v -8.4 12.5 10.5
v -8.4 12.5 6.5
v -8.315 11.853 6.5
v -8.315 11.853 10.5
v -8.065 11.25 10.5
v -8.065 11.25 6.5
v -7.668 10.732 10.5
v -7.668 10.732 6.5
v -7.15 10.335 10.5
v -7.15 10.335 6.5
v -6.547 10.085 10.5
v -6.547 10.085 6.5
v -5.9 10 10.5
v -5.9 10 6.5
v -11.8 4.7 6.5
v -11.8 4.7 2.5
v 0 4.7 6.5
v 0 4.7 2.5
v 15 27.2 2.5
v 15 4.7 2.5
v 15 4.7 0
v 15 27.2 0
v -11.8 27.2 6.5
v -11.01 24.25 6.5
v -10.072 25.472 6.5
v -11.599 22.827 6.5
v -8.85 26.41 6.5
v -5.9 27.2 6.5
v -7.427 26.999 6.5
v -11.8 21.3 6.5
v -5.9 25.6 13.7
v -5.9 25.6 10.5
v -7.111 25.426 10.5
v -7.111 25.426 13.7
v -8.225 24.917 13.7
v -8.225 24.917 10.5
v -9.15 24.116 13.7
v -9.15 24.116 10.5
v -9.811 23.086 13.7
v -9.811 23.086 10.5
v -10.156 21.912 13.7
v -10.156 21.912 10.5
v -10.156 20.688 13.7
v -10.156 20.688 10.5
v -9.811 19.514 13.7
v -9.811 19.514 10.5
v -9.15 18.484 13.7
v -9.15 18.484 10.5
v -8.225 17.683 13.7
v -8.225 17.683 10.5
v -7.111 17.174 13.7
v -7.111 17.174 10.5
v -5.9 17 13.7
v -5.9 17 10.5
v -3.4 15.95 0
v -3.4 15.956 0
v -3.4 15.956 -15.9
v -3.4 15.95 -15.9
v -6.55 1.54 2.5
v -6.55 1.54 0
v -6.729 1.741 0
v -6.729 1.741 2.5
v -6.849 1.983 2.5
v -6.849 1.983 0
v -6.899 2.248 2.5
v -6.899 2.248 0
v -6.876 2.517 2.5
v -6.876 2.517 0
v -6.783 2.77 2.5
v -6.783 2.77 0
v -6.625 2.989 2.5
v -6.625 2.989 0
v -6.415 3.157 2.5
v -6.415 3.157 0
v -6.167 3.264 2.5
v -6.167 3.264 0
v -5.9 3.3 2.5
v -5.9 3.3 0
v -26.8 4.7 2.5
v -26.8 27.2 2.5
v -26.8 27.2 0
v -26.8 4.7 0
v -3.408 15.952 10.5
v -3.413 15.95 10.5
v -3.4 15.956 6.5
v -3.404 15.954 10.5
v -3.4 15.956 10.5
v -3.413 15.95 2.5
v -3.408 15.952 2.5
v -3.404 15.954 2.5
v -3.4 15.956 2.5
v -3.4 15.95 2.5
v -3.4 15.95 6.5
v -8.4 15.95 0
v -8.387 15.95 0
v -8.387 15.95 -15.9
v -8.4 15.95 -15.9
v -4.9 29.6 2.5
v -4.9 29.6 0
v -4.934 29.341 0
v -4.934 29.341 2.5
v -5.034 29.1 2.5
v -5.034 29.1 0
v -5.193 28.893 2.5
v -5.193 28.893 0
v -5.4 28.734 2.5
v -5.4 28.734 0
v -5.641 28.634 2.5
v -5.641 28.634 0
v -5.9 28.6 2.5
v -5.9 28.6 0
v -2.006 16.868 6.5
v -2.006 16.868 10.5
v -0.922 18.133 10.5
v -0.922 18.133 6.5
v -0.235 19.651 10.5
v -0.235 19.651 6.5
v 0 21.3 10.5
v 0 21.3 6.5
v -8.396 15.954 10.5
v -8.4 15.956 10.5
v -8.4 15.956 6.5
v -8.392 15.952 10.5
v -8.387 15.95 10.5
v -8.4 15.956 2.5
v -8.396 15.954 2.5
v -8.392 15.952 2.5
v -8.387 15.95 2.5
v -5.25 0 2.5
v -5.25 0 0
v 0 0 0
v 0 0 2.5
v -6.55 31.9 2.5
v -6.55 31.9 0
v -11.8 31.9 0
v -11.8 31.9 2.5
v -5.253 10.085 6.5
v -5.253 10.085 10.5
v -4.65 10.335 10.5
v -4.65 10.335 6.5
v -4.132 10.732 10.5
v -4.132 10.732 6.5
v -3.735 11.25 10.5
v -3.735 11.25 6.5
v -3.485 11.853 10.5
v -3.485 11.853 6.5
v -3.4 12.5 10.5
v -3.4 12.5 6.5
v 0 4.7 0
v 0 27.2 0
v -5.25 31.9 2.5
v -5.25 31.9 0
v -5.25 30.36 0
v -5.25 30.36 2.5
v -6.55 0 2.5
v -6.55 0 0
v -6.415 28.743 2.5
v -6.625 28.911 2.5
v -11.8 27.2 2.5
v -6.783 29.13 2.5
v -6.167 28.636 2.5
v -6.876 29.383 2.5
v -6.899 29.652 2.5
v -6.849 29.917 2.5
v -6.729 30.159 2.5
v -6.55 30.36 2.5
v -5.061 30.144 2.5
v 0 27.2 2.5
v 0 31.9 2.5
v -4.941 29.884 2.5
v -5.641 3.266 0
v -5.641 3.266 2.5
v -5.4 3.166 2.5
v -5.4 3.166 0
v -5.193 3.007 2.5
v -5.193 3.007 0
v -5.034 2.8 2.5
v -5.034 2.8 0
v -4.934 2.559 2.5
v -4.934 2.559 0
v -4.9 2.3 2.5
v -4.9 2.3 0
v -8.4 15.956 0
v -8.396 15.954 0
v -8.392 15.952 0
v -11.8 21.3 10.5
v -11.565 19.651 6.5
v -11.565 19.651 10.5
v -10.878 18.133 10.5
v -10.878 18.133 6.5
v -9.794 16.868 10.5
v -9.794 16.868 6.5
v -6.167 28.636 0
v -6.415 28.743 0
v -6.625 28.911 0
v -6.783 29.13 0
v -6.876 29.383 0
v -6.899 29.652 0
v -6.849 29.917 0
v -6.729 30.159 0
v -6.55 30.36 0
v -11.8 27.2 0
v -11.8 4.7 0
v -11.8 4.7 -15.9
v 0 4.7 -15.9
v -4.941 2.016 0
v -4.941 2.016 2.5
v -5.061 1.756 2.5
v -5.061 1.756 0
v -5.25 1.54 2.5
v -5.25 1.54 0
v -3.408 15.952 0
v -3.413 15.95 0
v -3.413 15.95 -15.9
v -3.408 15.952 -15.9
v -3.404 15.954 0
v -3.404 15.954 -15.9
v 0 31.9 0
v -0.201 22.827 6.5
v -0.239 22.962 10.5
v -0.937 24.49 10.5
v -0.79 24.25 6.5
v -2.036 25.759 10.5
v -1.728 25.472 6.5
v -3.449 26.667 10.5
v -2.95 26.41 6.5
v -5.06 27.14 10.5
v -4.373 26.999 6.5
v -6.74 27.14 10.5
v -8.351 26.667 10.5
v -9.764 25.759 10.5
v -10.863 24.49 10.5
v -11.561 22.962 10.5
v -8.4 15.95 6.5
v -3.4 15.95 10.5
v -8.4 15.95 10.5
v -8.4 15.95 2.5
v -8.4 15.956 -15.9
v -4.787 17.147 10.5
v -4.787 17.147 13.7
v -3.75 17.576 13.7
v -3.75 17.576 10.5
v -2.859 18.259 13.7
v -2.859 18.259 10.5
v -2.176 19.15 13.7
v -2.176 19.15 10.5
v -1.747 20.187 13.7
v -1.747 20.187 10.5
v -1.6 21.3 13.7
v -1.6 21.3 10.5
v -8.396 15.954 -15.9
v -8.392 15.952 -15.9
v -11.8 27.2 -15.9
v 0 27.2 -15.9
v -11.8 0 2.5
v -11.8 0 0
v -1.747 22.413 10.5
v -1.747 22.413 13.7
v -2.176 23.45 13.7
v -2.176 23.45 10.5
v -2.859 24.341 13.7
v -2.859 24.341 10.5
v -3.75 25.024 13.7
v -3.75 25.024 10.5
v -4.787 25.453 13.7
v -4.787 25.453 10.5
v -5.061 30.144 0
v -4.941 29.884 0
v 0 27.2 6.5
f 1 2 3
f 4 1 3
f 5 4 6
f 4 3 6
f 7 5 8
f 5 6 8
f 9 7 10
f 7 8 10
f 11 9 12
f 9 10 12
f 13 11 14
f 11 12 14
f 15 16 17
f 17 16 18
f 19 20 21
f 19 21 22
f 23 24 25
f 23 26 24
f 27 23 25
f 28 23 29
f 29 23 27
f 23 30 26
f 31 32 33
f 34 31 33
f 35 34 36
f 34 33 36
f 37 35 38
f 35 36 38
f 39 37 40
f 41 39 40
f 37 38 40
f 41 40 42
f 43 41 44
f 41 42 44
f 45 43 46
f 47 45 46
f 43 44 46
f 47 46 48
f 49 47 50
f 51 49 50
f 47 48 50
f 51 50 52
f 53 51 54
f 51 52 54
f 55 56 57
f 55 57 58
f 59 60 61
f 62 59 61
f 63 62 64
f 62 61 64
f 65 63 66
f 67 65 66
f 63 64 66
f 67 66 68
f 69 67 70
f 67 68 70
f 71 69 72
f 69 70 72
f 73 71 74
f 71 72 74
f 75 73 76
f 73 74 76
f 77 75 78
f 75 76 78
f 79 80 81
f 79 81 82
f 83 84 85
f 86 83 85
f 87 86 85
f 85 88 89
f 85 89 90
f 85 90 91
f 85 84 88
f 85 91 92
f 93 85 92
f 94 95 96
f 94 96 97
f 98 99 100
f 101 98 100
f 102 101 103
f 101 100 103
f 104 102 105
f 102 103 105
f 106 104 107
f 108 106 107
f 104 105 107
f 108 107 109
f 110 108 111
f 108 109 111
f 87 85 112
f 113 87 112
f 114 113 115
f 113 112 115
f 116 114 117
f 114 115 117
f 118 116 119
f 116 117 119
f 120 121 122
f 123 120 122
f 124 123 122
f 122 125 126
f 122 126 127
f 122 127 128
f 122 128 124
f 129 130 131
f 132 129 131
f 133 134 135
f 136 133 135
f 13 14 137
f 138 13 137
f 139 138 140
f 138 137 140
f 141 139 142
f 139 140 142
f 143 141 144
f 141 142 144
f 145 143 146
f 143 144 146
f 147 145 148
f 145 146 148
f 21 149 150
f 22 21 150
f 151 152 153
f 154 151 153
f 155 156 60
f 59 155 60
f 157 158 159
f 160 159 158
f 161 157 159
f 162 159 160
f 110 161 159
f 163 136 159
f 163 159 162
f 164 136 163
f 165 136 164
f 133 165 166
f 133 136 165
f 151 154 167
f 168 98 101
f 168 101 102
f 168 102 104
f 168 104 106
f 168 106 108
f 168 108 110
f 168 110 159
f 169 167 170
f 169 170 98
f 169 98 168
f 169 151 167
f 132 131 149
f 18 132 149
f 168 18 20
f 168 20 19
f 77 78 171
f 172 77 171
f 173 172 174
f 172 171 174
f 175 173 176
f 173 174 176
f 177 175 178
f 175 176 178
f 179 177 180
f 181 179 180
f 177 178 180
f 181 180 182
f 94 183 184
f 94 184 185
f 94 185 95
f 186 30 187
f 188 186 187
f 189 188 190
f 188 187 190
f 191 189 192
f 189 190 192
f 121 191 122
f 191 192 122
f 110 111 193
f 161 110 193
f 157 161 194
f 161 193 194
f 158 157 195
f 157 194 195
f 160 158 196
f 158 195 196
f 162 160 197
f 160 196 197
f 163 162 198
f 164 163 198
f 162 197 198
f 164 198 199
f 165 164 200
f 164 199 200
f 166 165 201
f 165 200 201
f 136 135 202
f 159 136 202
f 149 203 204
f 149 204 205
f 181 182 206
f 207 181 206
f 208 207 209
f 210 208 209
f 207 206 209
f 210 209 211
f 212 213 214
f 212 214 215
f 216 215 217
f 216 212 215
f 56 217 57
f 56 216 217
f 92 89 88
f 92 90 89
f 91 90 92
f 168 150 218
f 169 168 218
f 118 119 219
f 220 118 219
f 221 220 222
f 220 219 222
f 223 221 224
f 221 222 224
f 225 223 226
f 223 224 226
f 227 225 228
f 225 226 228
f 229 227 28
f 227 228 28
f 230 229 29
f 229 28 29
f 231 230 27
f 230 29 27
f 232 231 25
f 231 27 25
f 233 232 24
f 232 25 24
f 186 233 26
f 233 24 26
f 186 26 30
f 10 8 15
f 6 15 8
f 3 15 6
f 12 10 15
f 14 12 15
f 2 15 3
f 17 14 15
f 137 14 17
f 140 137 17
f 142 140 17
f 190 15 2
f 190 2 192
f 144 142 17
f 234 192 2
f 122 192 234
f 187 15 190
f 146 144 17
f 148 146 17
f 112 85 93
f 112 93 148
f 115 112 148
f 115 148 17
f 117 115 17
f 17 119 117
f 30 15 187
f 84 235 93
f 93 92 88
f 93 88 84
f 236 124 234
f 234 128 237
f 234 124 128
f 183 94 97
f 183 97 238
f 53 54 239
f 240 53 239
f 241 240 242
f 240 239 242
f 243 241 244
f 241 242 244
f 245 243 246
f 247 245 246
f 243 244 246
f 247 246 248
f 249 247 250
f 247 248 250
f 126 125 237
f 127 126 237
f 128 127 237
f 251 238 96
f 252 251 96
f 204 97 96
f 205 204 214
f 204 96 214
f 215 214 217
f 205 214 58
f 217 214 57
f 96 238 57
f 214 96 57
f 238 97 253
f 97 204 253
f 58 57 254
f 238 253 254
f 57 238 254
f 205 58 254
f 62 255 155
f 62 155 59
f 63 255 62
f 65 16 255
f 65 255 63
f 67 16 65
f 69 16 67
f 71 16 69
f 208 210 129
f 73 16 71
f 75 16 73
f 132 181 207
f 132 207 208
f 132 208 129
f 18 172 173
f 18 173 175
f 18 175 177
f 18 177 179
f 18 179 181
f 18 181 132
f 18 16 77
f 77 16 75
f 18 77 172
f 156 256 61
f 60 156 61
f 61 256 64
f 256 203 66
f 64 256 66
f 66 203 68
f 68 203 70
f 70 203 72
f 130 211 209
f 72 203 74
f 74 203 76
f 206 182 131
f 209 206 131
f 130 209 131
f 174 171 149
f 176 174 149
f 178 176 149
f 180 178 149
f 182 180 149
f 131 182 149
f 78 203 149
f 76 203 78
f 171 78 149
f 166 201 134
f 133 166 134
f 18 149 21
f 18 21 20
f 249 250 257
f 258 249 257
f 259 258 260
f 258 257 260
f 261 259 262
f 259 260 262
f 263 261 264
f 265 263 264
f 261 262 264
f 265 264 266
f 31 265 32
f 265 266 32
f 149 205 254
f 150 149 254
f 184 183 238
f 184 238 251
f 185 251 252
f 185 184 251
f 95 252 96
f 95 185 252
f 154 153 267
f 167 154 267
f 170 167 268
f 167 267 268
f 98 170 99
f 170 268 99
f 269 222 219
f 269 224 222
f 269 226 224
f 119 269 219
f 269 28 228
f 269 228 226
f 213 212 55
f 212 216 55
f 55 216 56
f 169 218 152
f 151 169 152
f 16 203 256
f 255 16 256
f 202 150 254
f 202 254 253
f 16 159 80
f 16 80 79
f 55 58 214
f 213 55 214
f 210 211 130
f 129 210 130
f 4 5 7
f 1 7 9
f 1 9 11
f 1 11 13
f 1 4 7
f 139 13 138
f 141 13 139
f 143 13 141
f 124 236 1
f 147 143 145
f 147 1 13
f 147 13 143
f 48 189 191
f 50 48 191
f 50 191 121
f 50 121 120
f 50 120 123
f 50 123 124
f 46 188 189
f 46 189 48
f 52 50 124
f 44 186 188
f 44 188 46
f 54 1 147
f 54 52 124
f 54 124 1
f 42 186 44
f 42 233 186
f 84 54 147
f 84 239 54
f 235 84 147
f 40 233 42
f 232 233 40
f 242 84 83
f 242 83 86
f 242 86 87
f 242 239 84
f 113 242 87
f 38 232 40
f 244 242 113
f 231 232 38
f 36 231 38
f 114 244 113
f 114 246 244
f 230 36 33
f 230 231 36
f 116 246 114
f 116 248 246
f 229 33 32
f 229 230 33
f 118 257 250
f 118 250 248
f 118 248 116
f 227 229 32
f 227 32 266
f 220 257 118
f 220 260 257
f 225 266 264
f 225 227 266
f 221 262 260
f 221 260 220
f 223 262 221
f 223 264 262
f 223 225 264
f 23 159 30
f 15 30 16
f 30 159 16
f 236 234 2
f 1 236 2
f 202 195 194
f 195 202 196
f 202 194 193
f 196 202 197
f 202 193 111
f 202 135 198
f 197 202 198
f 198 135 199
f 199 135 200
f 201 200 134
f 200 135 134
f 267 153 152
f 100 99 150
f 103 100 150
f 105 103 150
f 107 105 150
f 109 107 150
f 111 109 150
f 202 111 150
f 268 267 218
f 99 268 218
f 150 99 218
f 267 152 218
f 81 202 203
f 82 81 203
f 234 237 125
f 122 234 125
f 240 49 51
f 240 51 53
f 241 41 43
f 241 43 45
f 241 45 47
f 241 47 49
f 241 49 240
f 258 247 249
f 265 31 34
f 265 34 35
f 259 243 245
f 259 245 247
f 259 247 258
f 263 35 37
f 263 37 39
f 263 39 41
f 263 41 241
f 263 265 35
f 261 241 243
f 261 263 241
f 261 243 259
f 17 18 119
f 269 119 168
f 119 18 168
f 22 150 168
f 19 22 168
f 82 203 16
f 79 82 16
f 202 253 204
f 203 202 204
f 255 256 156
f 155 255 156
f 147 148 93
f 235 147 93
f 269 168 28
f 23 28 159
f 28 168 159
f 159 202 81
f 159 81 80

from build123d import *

# Parameters (mm, degrees)
F1_DEPTH  = 15.9
F2_DEPTH  = 2.5
F5_DEPTH  = 4
F8_DEPTH  = 4
F11_DEPTH = 3.2
F12_W     = 22.5
F12_H     = 2.5
F13_DEPTH = 15
F14_W     = 22.5
F14_H     = 2.5
F15_DEPTH = 15


with BuildPart() as f1:
    # F0 (on Top) → F1 (new body)
    with BuildSketch(Plane.XY):
        with BuildLine():
            ThreePointArc((-5.9, 27.2), (-1.728069991, 25.471930009), (0, 21.3))
            Line((0, 21.3), (0, 27.2))
            Line((0, 27.2), (-5.9, 27.2))
        make_face()
        with BuildLine():
            ThreePointArc((-11.8, 21.3), (-10.071930009, 25.471930009), (-5.9, 27.2))
            Line((-5.9, 27.2), (-11.8, 27.2))
            Line((-11.8, 27.2), (-11.8, 21.3))
        make_face()
        with BuildLine():
            Line((-3.4, 15.95), (0, 15.95))
            Line((0, 15.95), (0, 21.3))
            ThreePointArc((0, 21.3), (-0.9220486141, 18.1329824756), (-3.4, 15.9558443136))
            Line((-3.4, 15.9558443136), (-3.4, 15.95))
        make_face()
        with BuildLine():
            Line((-11.8, 21.3), (-11.8, 15.95))
            Line((-11.8, 15.95), (-8.4, 15.95))
            Line((-8.4, 15.95), (-8.4, 15.9558443136))
            ThreePointArc((-8.4, 15.9558443136), (-10.8779513859, 18.1329824756), (-11.8, 21.3))
        make_face()
        with BuildLine():
            Line((-5.9, 4.7), (0, 4.7))
            Line((0, 4.7), (0, 15.95))
            Line((0, 15.95), (-3.4, 15.95))
            Line((-3.4, 15.95), (-3.4, 12.5))
            ThreePointArc((-3.4, 12.5), (-4.132233047, 10.732233047), (-5.9, 10))
            Line((-5.9, 10), (-5.9, 4.7))
        make_face()
        with BuildLine():
            Line((-11.8, 4.7), (-5.9, 4.7))
            Line((-5.9, 4.7), (-5.9, 10))
            ThreePointArc((-5.9, 10), (-7.667766953, 10.732233047), (-8.4, 12.5))
            Line((-8.4, 12.5), (-8.4, 15.95))
            Line((-8.4, 15.95), (-11.8, 15.95))
            Line((-11.8, 15.95), (-11.8, 4.7))
        make_face()
        with BuildLine():
            ThreePointArc((-3.4, 15.9558443136), (-0.9220486141, 18.1329824756), (0, 21.3))
            ThreePointArc((0, 21.3), (-1.728069991, 25.471930009), (-5.9, 27.2))
            Line((-5.9, 27.2), (-5.9, 23.6))
            ThreePointArc((-5.9, 23.6), (-4.2736544033, 22.9263455967), (-3.6, 21.3))
            ThreePointArc((-3.6, 21.3), (-4.2736544033, 19.6736544033), (-5.9, 19))
            Line((-5.9, 19), (-5.9, 15.95))
            Line((-5.9, 15.95), (-3.4125314072, 15.95))
            ThreePointArc((-3.4125314072, 15.95), (-3.4062639915, 15.9529184857), (-3.4, 15.9558443136))
        make_face()
        with BuildLine():
            ThreePointArc((-3.6, 21.3), (-4.2736544033, 22.9263455967), (-5.9, 23.6))
            Line((-5.9, 23.6), (-5.9, 22.15))
            ThreePointArc((-5.9, 22.15), (-5.298959236, 21.901040764), (-5.05, 21.3))
            ThreePointArc((-5.05, 21.3), (-5.298959236, 20.698959236), (-5.9, 20.45))
            Line((-5.9, 20.45), (-5.9, 19))
            ThreePointArc((-5.9, 19), (-4.2736544033, 19.6736544033), (-3.6, 21.3))
        make_face()
        with BuildLine():
            Line((-5.9, 22.15), (-5.9, 23.6))
            ThreePointArc((-5.9, 23.6), (-8.2, 21.3), (-5.9, 19))
            Line((-5.9, 19), (-5.9, 20.45))
            ThreePointArc((-5.9, 20.45), (-6.75, 21.3), (-5.9, 22.15))
        make_face()
        with BuildLine():
            ThreePointArc((-5.05, 21.3), (-5.298959236, 21.901040764), (-5.9, 22.15))
            Line((-5.9, 22.15), (-5.9, 20.45))
            ThreePointArc((-5.9, 20.45), (-5.298959236, 20.698959236), (-5.05, 21.3))
        make_face()
        with BuildLine():
            Line((-5.9, 20.45), (-5.9, 22.15))
            ThreePointArc((-5.9, 22.15), (-6.75, 21.3), (-5.9, 20.45))
        make_face()
        with BuildLine():
            ThreePointArc((-8.4, 12.5), (-7.667766953, 10.732233047), (-5.9, 10))
            Line((-5.9, 10), (-5.9, 15))
            ThreePointArc((-5.9, 15), (-7.667766953, 14.267766953), (-8.4, 12.5))
        make_face()
        with BuildLine():
            Line((-5.9, 15), (-5.9, 10))
            ThreePointArc((-5.9, 10), (-4.132233047, 10.732233047), (-3.4, 12.5))
            ThreePointArc((-3.4, 12.5), (-4.132233047, 14.267766953), (-5.9, 15))
        make_face()
        with BuildLine():
            Line((-3.4, 12.5), (-3.4, 15.95))
            Line((-3.4, 15.95), (-3.4125314072, 15.95))
            ThreePointArc((-3.4125314072, 15.95), (-4.6262260797, 15.5391406891), (-5.9, 15.4))
            Line((-5.9, 15.4), (-5.9, 15))
            ThreePointArc((-5.9, 15), (-4.132233047, 14.267766953), (-3.4, 12.5))
        make_face()
        with BuildLine():
            ThreePointArc((-5.9, 15.4), (-4.6262260797, 15.5391406891), (-3.4125314072, 15.95))
            Line((-3.4125314072, 15.95), (-5.9, 15.95))
            Line((-5.9, 15.95), (-5.9, 15.4))
        make_face()
        with BuildLine():
            ThreePointArc((-8.4, 12.5), (-7.667766953, 14.267766953), (-5.9, 15))
            Line((-5.9, 15), (-5.9, 15.4))
            ThreePointArc((-5.9, 15.4), (-7.1737739203, 15.5391406891), (-8.3874685928, 15.95))
            Line((-8.3874685928, 15.95), (-8.4, 15.95))
            Line((-8.4, 15.95), (-8.4, 12.5))
        make_face()
        with BuildLine():
            Line((-5.9, 23.6), (-5.9, 27.2))
            ThreePointArc((-5.9, 27.2), (-10.071930009, 25.471930009), (-11.8, 21.3))
            ThreePointArc((-11.8, 21.3), (-10.8779513859, 18.1329824756), (-8.4, 15.9558443136))
            ThreePointArc((-8.4, 15.9558443136), (-8.3937360085, 15.9529184857), (-8.3874685928, 15.95))
            Line((-8.3874685928, 15.95), (-5.9, 15.95))
            Line((-5.9, 15.95), (-5.9, 19))
            ThreePointArc((-5.9, 19), (-8.2, 21.3), (-5.9, 23.6))
        make_face()
        with BuildLine():
            ThreePointArc((-8.3874685928, 15.95), (-7.1737739203, 15.5391406891), (-5.9, 15.4))
            Line((-5.9, 15.4), (-5.9, 15.95))
            Line((-5.9, 15.95), (-8.3874685928, 15.95))
        make_face()
    extrude(amount=-F1_DEPTH)

    # F0 (on Top) → F2 (join)
    with BuildSketch(Plane.XY):
        with BuildLine():
            ThreePointArc((-5.9, 27.2), (-1.728069991, 25.471930009), (0, 21.3))
            Line((0, 21.3), (0, 27.2))
            Line((0, 27.2), (-5.9, 27.2))
        make_face()
        with BuildLine():
            ThreePointArc((-11.8, 21.3), (-10.071930009, 25.471930009), (-5.9, 27.2))
            Line((-5.9, 27.2), (-11.8, 27.2))
            Line((-11.8, 27.2), (-11.8, 21.3))
        make_face()
        with BuildLine():
            Line((-3.4, 15.95), (0, 15.95))
            Line((0, 15.95), (0, 21.3))
            ThreePointArc((0, 21.3), (-0.9220486141, 18.1329824756), (-3.4, 15.9558443136))
            Line((-3.4, 15.9558443136), (-3.4, 15.95))
        make_face()
        with BuildLine():
            Line((-11.8, 21.3), (-11.8, 15.95))
            Line((-11.8, 15.95), (-8.4, 15.95))
            Line((-8.4, 15.95), (-8.4, 15.9558443136))
            ThreePointArc((-8.4, 15.9558443136), (-10.8779513859, 18.1329824756), (-11.8, 21.3))
        make_face()
        with BuildLine():
            Line((-5.25, 0), (0, 0))
            Line((0, 0), (0, 4.7))
            Line((0, 4.7), (-5.9, 4.7))
            Line((-5.9, 4.7), (-5.9, 3.3))
            ThreePointArc((-5.9, 3.3), (-5.1928932188, 3.0071067812), (-4.9, 2.3))
            ThreePointArc((-4.9, 2.3), (-4.9917048938, 1.8816699867), (-5.25, 1.5400657923))
            Line((-5.25, 1.5400657923), (-5.25, 0))
        make_face()
        with BuildLine():
            Line((-5.9, 3.3), (-5.9, 4.7))
            Line((-5.9, 4.7), (-11.8, 4.7))
            Line((-11.8, 4.7), (-11.8, 0))
            Line((-11.8, 0), (-6.55, 0))
            Line((-6.55, 0), (-6.55, 1.5400657923))
            ThreePointArc((-6.55, 1.5400657923), (-6.8380656181, 2.6464576398), (-5.9, 3.3))
        make_face()
        with BuildLine():
            Line((-5.9, 27.2), (0, 27.2))
            Line((0, 27.2), (0, 31.9))
            Line((0, 31.9), (-5.25, 31.9))
            Line((-5.25, 31.9), (-5.25, 30.3599342077))
            ThreePointArc((-5.25, 30.3599342077), (-4.9917048938, 30.0183300133), (-4.9, 29.6))
            ThreePointArc((-4.9, 29.6), (-5.1928932188, 28.8928932188), (-5.9, 28.6))
            Line((-5.9, 28.6), (-5.9, 27.2))
        make_face()
        with BuildLine():
            Line((-11.8, 27.2), (-5.9, 27.2))
            Line((-5.9, 27.2), (-5.9, 28.6))
            ThreePointArc((-5.9, 28.6), (-6.8380656181, 29.2535423602), (-6.55, 30.3599342077))
            Line((-6.55, 30.3599342077), (-6.55, 31.9))
            Line((-6.55, 31.9), (-11.8, 31.9))
            Line((-11.8, 31.9), (-11.8, 27.2))
        make_face()
        with BuildLine():
            Line((-5.9, 4.7), (0, 4.7))
            Line((0, 4.7), (0, 15.95))
            Line((0, 15.95), (-3.4, 15.95))
            Line((-3.4, 15.95), (-3.4, 12.5))
            ThreePointArc((-3.4, 12.5), (-4.132233047, 10.732233047), (-5.9, 10))
            Line((-5.9, 10), (-5.9, 4.7))
        make_face()
        with BuildLine():
            Line((-11.8, 4.7), (-5.9, 4.7))
            Line((-5.9, 4.7), (-5.9, 10))
            ThreePointArc((-5.9, 10), (-7.667766953, 10.732233047), (-8.4, 12.5))
            Line((-8.4, 12.5), (-8.4, 15.95))
            Line((-8.4, 15.95), (-11.8, 15.95))
            Line((-11.8, 15.95), (-11.8, 4.7))
        make_face()
        with BuildLine():
            ThreePointArc((-3.4, 15.9558443136), (-0.9220486141, 18.1329824756), (0, 21.3))
            ThreePointArc((0, 21.3), (-1.728069991, 25.471930009), (-5.9, 27.2))
            Line((-5.9, 27.2), (-5.9, 23.6))
            ThreePointArc((-5.9, 23.6), (-4.2736544033, 22.9263455967), (-3.6, 21.3))
            ThreePointArc((-3.6, 21.3), (-4.2736544033, 19.6736544033), (-5.9, 19))
            Line((-5.9, 19), (-5.9, 15.95))
            Line((-5.9, 15.95), (-3.4125314072, 15.95))
            ThreePointArc((-3.4125314072, 15.95), (-3.4062639915, 15.9529184857), (-3.4, 15.9558443136))
        make_face()
        with BuildLine():
            Line((-5.9, 23.6), (-5.9, 27.2))
            ThreePointArc((-5.9, 27.2), (-10.071930009, 25.471930009), (-11.8, 21.3))
            ThreePointArc((-11.8, 21.3), (-10.8779513859, 18.1329824756), (-8.4, 15.9558443136))
            ThreePointArc((-8.4, 15.9558443136), (-8.3937360085, 15.9529184857), (-8.3874685928, 15.95))
            Line((-8.3874685928, 15.95), (-5.9, 15.95))
            Line((-5.9, 15.95), (-5.9, 19))
            ThreePointArc((-5.9, 19), (-8.2, 21.3), (-5.9, 23.6))
        make_face()
        with BuildLine():
            ThreePointArc((-5.9, 15.4), (-4.6262260797, 15.5391406891), (-3.4125314072, 15.95))
            Line((-3.4125314072, 15.95), (-5.9, 15.95))
            Line((-5.9, 15.95), (-5.9, 15.4))
        make_face()
        with BuildLine():
            ThreePointArc((-8.3874685928, 15.95), (-7.1737739203, 15.5391406891), (-5.9, 15.4))
            Line((-5.9, 15.4), (-5.9, 15.95))
            Line((-5.9, 15.95), (-8.3874685928, 15.95))
        make_face()
        with BuildLine():
            Line((-5.9, 15), (-5.9, 10))
            ThreePointArc((-5.9, 10), (-4.132233047, 10.732233047), (-3.4, 12.5))
            ThreePointArc((-3.4, 12.5), (-4.132233047, 14.267766953), (-5.9, 15))
        make_face()
        with BuildLine():
            Line((-5.9, 22.15), (-5.9, 23.6))
            ThreePointArc((-5.9, 23.6), (-8.2, 21.3), (-5.9, 19))
            Line((-5.9, 19), (-5.9, 20.45))
            ThreePointArc((-5.9, 20.45), (-6.75, 21.3), (-5.9, 22.15))
        make_face()
        with BuildLine():
            Line((-3.4, 12.5), (-3.4, 15.95))
            Line((-3.4, 15.95), (-3.4125314072, 15.95))
            ThreePointArc((-3.4125314072, 15.95), (-4.6262260797, 15.5391406891), (-5.9, 15.4))
            Line((-5.9, 15.4), (-5.9, 15))
            ThreePointArc((-5.9, 15), (-4.132233047, 14.267766953), (-3.4, 12.5))
        make_face()
        with BuildLine():
            ThreePointArc((-3.6, 21.3), (-4.2736544033, 22.9263455967), (-5.9, 23.6))
            Line((-5.9, 23.6), (-5.9, 22.15))
            ThreePointArc((-5.9, 22.15), (-5.298959236, 21.901040764), (-5.05, 21.3))
            ThreePointArc((-5.05, 21.3), (-5.298959236, 20.698959236), (-5.9, 20.45))
            Line((-5.9, 20.45), (-5.9, 19))
            ThreePointArc((-5.9, 19), (-4.2736544033, 19.6736544033), (-3.6, 21.3))
        make_face()
        with BuildLine():
            ThreePointArc((-8.4, 12.5), (-7.667766953, 10.732233047), (-5.9, 10))
            Line((-5.9, 10), (-5.9, 15))
            ThreePointArc((-5.9, 15), (-7.667766953, 14.267766953), (-8.4, 12.5))
        make_face()
        with BuildLine():
            ThreePointArc((-8.4, 12.5), (-7.667766953, 14.267766953), (-5.9, 15))
            Line((-5.9, 15), (-5.9, 15.4))
            ThreePointArc((-5.9, 15.4), (-7.1737739203, 15.5391406891), (-8.3874685928, 15.95))
            Line((-8.3874685928, 15.95), (-8.4, 15.95))
            Line((-8.4, 15.95), (-8.4, 12.5))
        make_face()
        with BuildLine():
            Line((-8.4, 15.9558443136), (-8.4, 15.95))
            Line((-8.4, 15.95), (-8.3874685928, 15.95))
            ThreePointArc((-8.3874685928, 15.95), (-8.3937360085, 15.9529184857), (-8.4, 15.9558443136))
        make_face()
        with BuildLine():
            Line((-3.4125314072, 15.95), (-3.4, 15.95))
            Line((-3.4, 15.95), (-3.4, 15.9558443136))
            ThreePointArc((-3.4, 15.9558443136), (-3.4062639915, 15.9529184857), (-3.4125314072, 15.95))
        make_face()
        with BuildLine():
            ThreePointArc((-5.05, 21.3), (-5.298959236, 21.901040764), (-5.9, 22.15))
            Line((-5.9, 22.15), (-5.9, 20.45))
            ThreePointArc((-5.9, 20.45), (-5.298959236, 20.698959236), (-5.05, 21.3))
        make_face()
        with BuildLine():
            Line((-5.9, 20.45), (-5.9, 22.15))
            ThreePointArc((-5.9, 22.15), (-6.75, 21.3), (-5.9, 20.45))
        make_face()
    extrude(amount=F2_DEPTH)

    # F4 (on face) → F5 (join)
    with BuildSketch(Plane.XY.offset(2.5)):
        with BuildLine():
            ThreePointArc((-5.9, 27.2), (-1.728069991, 25.471930009), (0, 21.3))
            Line((0, 21.3), (0, 27.2))
            Line((0, 27.2), (-5.9, 27.2))
        make_face()
        with BuildLine():
            ThreePointArc((-11.8, 21.3), (-10.071930009, 25.471930009), (-5.9, 27.2))
            Line((-5.9, 27.2), (-11.8, 27.2))
            Line((-11.8, 27.2), (-11.8, 21.3))
        make_face()
        with BuildLine():
            Line((-3.4, 15.95), (0, 15.95))
            Line((0, 15.95), (0, 21.3))
            ThreePointArc((0, 21.3), (-0.9220486141, 18.1329824756), (-3.4, 15.9558443136))
            Line((-3.4, 15.9558443136), (-3.4, 15.95))
        make_face()
        with BuildLine():
            Line((-11.8, 21.3), (-11.8, 15.95))
            Line((-11.8, 15.95), (-8.4, 15.95))
            Line((-8.4, 15.95), (-8.4, 15.9558443136))
            ThreePointArc((-8.4, 15.9558443136), (-10.8779513859, 18.1329824756), (-11.8, 21.3))
        make_face()
        with BuildLine():
            Line((-5.9, 4.7), (0, 4.7))
            Line((0, 4.7), (0, 15.95))
            Line((0, 15.95), (-3.4, 15.95))
            Line((-3.4, 15.95), (-3.4, 12.5))
            ThreePointArc((-3.4, 12.5), (-4.132233047, 10.732233047), (-5.9, 10))
            Line((-5.9, 10), (-5.9, 4.7))
        make_face()
        with BuildLine():
            Line((-11.8, 4.7), (-5.9, 4.7))
            Line((-5.9, 4.7), (-5.9, 10))
            ThreePointArc((-5.9, 10), (-7.667766953, 10.732233047), (-8.4, 12.5))
            Line((-8.4, 12.5), (-8.4, 15.95))
            Line((-8.4, 15.95), (-11.8, 15.95))
            Line((-11.8, 15.95), (-11.8, 4.7))
        make_face()
        with BuildLine():
            ThreePointArc((-3.4, 15.9558443136), (-0.9220486141, 18.1329824756), (0, 21.3))
            ThreePointArc((0, 21.3), (-1.728069991, 25.471930009), (-5.9, 27.2))
            Line((-5.9, 27.2), (-5.9, 23.6))
            ThreePointArc((-5.9, 23.6), (-4.2736544033, 22.9263455967), (-3.6, 21.3))
            ThreePointArc((-3.6, 21.3), (-4.2736544033, 19.6736544033), (-5.9, 19))
            Line((-5.9, 19), (-5.9, 15.95))
            Line((-5.9, 15.95), (-3.4125314072, 15.95))
            ThreePointArc((-3.4125314072, 15.95), (-3.4062639915, 15.9529184857), (-3.4, 15.9558443136))
        make_face()
        with BuildLine():
            Line((-5.9, 23.6), (-5.9, 27.2))
            ThreePointArc((-5.9, 27.2), (-10.071930009, 25.471930009), (-11.8, 21.3))
            ThreePointArc((-11.8, 21.3), (-10.8779513859, 18.1329824756), (-8.4, 15.9558443136))
            ThreePointArc((-8.4, 15.9558443136), (-8.3937360085, 15.9529184857), (-8.3874685928, 15.95))
            Line((-8.3874685928, 15.95), (-5.9, 15.95))
            Line((-5.9, 15.95), (-5.9, 19))
            ThreePointArc((-5.9, 19), (-8.2, 21.3), (-5.9, 23.6))
        make_face()
        with BuildLine():
            Line((-5.9, 15), (-5.9, 10))
            ThreePointArc((-5.9, 10), (-4.132233047, 10.732233047), (-3.4, 12.5))
            ThreePointArc((-3.4, 12.5), (-4.132233047, 14.267766953), (-5.9, 15))
        make_face()
        with BuildLine():
            ThreePointArc((-8.4, 12.5), (-7.667766953, 10.732233047), (-5.9, 10))
            Line((-5.9, 10), (-5.9, 15))
            ThreePointArc((-5.9, 15), (-7.667766953, 14.267766953), (-8.4, 12.5))
        make_face()
        with BuildLine():
            ThreePointArc((-8.4, 12.5), (-7.667766953, 14.267766953), (-5.9, 15))
            Line((-5.9, 15), (-5.9, 15.4))
            ThreePointArc((-5.9, 15.4), (-7.1737739203, 15.5391406891), (-8.3874685928, 15.95))
            Line((-8.3874685928, 15.95), (-8.4, 15.95))
            Line((-8.4, 15.95), (-8.4, 12.5))
        make_face()
        with BuildLine():
            Line((-3.4, 12.5), (-3.4, 15.95))
            Line((-3.4, 15.95), (-3.4125314072, 15.95))
            ThreePointArc((-3.4125314072, 15.95), (-4.6262260797, 15.5391406891), (-5.9, 15.4))
            Line((-5.9, 15.4), (-5.9, 15))
            ThreePointArc((-5.9, 15), (-4.132233047, 14.267766953), (-3.4, 12.5))
        make_face()
        with BuildLine():
            ThreePointArc((-5.9, 15.4), (-4.6262260797, 15.5391406891), (-3.4125314072, 15.95))
            Line((-3.4125314072, 15.95), (-5.9, 15.95))
            Line((-5.9, 15.95), (-5.9, 15.4))
        make_face()
        with BuildLine():
            ThreePointArc((-8.3874685928, 15.95), (-7.1737739203, 15.5391406891), (-5.9, 15.4))
            Line((-5.9, 15.4), (-5.9, 15.95))
            Line((-5.9, 15.95), (-8.3874685928, 15.95))
        make_face()
        with BuildLine():
            Line((-5.9, 22.25), (-5.9, 23.6))
            ThreePointArc((-5.9, 23.6), (-8.2, 21.3), (-5.9, 19))
            Line((-5.9, 19), (-5.9, 20.35))
            ThreePointArc((-5.9, 20.35), (-6.85, 21.3), (-5.9, 22.25))
        make_face()
        with BuildLine():
            ThreePointArc((-3.6, 21.3), (-4.2736544033, 22.9263455967), (-5.9, 23.6))
            Line((-5.9, 23.6), (-5.9, 22.25))
            ThreePointArc((-5.9, 22.25), (-5.2282485579, 21.9717514421), (-4.95, 21.3))
            ThreePointArc((-4.95, 21.3), (-5.2282485579, 20.6282485579), (-5.9, 20.35))
            Line((-5.9, 20.35), (-5.9, 19))
            ThreePointArc((-5.9, 19), (-4.2736544033, 19.6736544033), (-3.6, 21.3))
        make_face()
        with BuildLine():
            Line((-5.9, 20.35), (-5.9, 22.25))
            ThreePointArc((-5.9, 22.25), (-6.85, 21.3), (-5.9, 20.35))
        make_face()
        with BuildLine():
            ThreePointArc((-4.95, 21.3), (-5.2282485579, 21.9717514421), (-5.9, 22.25))
            Line((-5.9, 22.25), (-5.9, 20.35))
            ThreePointArc((-5.9, 20.35), (-5.2282485579, 20.6282485579), (-4.95, 21.3))
        make_face()
    extrude(amount=F5_DEPTH)

    # F7 (on face) → F8 (join)
    with BuildSketch(Plane.XY.offset(6.5)):
        with BuildLine():
            Line((-5.9, 23.6), (-5.9, 27.2))
            ThreePointArc((-5.9, 27.2), (-10.071930009, 25.471930009), (-11.8, 21.3))
            ThreePointArc((-11.8, 21.3), (-10.8779513859, 18.1329824756), (-8.4, 15.9558443136))
            ThreePointArc((-8.4, 15.9558443136), (-8.3937360085, 15.9529184857), (-8.3874685928, 15.95))
            Line((-8.3874685928, 15.95), (-5.9, 15.95))
            Line((-5.9, 15.95), (-5.9, 19))
            ThreePointArc((-5.9, 19), (-8.2, 21.3), (-5.9, 23.6))
        make_face()
        with BuildLine():
            ThreePointArc((-3.4, 15.9558443136), (-0.9220486141, 18.1329824756), (0, 21.3))
            ThreePointArc((0, 21.3), (-1.728069991, 25.471930009), (-5.9, 27.2))
            Line((-5.9, 27.2), (-5.9, 23.6))
            ThreePointArc((-5.9, 23.6), (-4.2736544033, 22.9263455967), (-3.6, 21.3))
            ThreePointArc((-3.6, 21.3), (-4.2736544033, 19.6736544033), (-5.9, 19))
            Line((-5.9, 19), (-5.9, 15.95))
            Line((-5.9, 15.95), (-3.4125314072, 15.95))
            ThreePointArc((-3.4125314072, 15.95), (-3.4062639915, 15.9529184857), (-3.4, 15.9558443136))
        make_face()
        with BuildLine():
            ThreePointArc((-8.3874685928, 15.95), (-7.1737739203, 15.5391406891), (-5.9, 15.4))
            Line((-5.9, 15.4), (-5.9, 15.95))
            Line((-5.9, 15.95), (-8.3874685928, 15.95))
        make_face()
        with BuildLine():
            ThreePointArc((-5.9, 15.4), (-4.6262260797, 15.5391406891), (-3.4125314072, 15.95))
            Line((-3.4125314072, 15.95), (-5.9, 15.95))
            Line((-5.9, 15.95), (-5.9, 15.4))
        make_face()
        with BuildLine():
            ThreePointArc((-8.4, 12.5), (-7.667766953, 14.267766953), (-5.9, 15))
            Line((-5.9, 15), (-5.9, 15.4))
            ThreePointArc((-5.9, 15.4), (-7.1737739203, 15.5391406891), (-8.3874685928, 15.95))
            Line((-8.3874685928, 15.95), (-8.4, 15.95))
            Line((-8.4, 15.95), (-8.4, 12.5))
        make_face()
        with BuildLine():
            Line((-3.4, 12.5), (-3.4, 15.95))
            Line((-3.4, 15.95), (-3.4125314072, 15.95))
            ThreePointArc((-3.4125314072, 15.95), (-4.6262260797, 15.5391406891), (-5.9, 15.4))
            Line((-5.9, 15.4), (-5.9, 15))
            ThreePointArc((-5.9, 15), (-4.132233047, 14.267766953), (-3.4, 12.5))
        make_face()
        with BuildLine():
            ThreePointArc((-8.4, 12.5), (-7.667766953, 10.732233047), (-5.9, 10))
            Line((-5.9, 10), (-5.9, 15))
            ThreePointArc((-5.9, 15), (-7.667766953, 14.267766953), (-8.4, 12.5))
        make_face()
        with BuildLine():
            Line((-5.9, 15), (-5.9, 10))
            ThreePointArc((-5.9, 10), (-4.132233047, 10.732233047), (-3.4, 12.5))
            ThreePointArc((-3.4, 12.5), (-4.132233047, 14.267766953), (-5.9, 15))
        make_face()
        with BuildLine():
            ThreePointArc((-3.6, 21.3), (-4.2736544033, 22.9263455967), (-5.9, 23.6))
            Line((-5.9, 23.6), (-5.9, 22.15))
            ThreePointArc((-5.9, 22.15), (-5.298959236, 21.901040764), (-5.05, 21.3))
            ThreePointArc((-5.05, 21.3), (-5.298959236, 20.698959236), (-5.9, 20.45))
            Line((-5.9, 20.45), (-5.9, 19))
            ThreePointArc((-5.9, 19), (-4.2736544033, 19.6736544033), (-3.6, 21.3))
        make_face()
        with BuildLine():
            Line((-5.9, 22.15), (-5.9, 23.6))
            ThreePointArc((-5.9, 23.6), (-8.2, 21.3), (-5.9, 19))
            Line((-5.9, 19), (-5.9, 20.45))
            ThreePointArc((-5.9, 20.45), (-6.75, 21.3), (-5.9, 22.15))
        make_face()
        with BuildLine():
            Line((-5.9, 20.45), (-5.9, 22.15))
            ThreePointArc((-5.9, 22.15), (-6.75, 21.3), (-5.9, 20.45))
        make_face()
        with BuildLine():
            ThreePointArc((-5.05, 21.3), (-5.298959236, 21.901040764), (-5.9, 22.15))
            Line((-5.9, 22.15), (-5.9, 20.45))
            ThreePointArc((-5.9, 20.45), (-5.298959236, 20.698959236), (-5.05, 21.3))
        make_face()
    extrude(amount=F8_DEPTH)

    # F10 (on offset) → F11 (join)
    with BuildSketch(Plane.XY.offset(10.5)):
        with BuildLine():
            Line((-5.9, 22.15), (-5.9, 25.6))
            ThreePointArc((-5.9, 25.6), (-10.2, 21.3), (-5.9, 17))
            Line((-5.9, 17), (-5.9, 20.45))
            ThreePointArc((-5.9, 20.45), (-6.75, 21.3), (-5.9, 22.15))
        make_face()
        with BuildLine():
            ThreePointArc((-1.6, 21.3), (-2.8594408409, 24.3405591591), (-5.9, 25.6))
            Line((-5.9, 25.6), (-5.9, 22.15))
            ThreePointArc((-5.9, 22.15), (-5.298959236, 21.901040764), (-5.05, 21.3))
            ThreePointArc((-5.05, 21.3), (-5.298959236, 20.698959236), (-5.9, 20.45))
            Line((-5.9, 20.45), (-5.9, 17))
            ThreePointArc((-5.9, 17), (-2.8594408409, 18.2594408409), (-1.6, 21.3))
        make_face()
        with BuildLine():
            ThreePointArc((-5.05, 21.3), (-5.298959236, 21.901040764), (-5.9, 22.15))
            Line((-5.9, 22.15), (-5.9, 20.45))
            ThreePointArc((-5.9, 20.45), (-5.298959236, 20.698959236), (-5.05, 21.3))
        make_face()
        with BuildLine():
            Line((-5.9, 20.45), (-5.9, 22.15))
            ThreePointArc((-5.9, 22.15), (-6.75, 21.3), (-5.9, 20.45))
        make_face()
    extrude(amount=F11_DEPTH)

    # F12 (on face) → F13 (join)
    with BuildSketch(Plane.YZ):
        with Locations((15.95, 1.25)):
            Rectangle(F12_W, F12_H)
    extrude(amount=F13_DEPTH)

    # F14 (on face) → F15 (join)
    with BuildSketch(Plane(origin=(-11.8, 0, 0), x_dir=(0, -1, 0), z_dir=(-1, 0, 0))):
        with Locations((-15.95, 1.25)):
            Rectangle(F14_W, F14_H)
    extrude(amount=F15_DEPTH)


solid = f1.part
